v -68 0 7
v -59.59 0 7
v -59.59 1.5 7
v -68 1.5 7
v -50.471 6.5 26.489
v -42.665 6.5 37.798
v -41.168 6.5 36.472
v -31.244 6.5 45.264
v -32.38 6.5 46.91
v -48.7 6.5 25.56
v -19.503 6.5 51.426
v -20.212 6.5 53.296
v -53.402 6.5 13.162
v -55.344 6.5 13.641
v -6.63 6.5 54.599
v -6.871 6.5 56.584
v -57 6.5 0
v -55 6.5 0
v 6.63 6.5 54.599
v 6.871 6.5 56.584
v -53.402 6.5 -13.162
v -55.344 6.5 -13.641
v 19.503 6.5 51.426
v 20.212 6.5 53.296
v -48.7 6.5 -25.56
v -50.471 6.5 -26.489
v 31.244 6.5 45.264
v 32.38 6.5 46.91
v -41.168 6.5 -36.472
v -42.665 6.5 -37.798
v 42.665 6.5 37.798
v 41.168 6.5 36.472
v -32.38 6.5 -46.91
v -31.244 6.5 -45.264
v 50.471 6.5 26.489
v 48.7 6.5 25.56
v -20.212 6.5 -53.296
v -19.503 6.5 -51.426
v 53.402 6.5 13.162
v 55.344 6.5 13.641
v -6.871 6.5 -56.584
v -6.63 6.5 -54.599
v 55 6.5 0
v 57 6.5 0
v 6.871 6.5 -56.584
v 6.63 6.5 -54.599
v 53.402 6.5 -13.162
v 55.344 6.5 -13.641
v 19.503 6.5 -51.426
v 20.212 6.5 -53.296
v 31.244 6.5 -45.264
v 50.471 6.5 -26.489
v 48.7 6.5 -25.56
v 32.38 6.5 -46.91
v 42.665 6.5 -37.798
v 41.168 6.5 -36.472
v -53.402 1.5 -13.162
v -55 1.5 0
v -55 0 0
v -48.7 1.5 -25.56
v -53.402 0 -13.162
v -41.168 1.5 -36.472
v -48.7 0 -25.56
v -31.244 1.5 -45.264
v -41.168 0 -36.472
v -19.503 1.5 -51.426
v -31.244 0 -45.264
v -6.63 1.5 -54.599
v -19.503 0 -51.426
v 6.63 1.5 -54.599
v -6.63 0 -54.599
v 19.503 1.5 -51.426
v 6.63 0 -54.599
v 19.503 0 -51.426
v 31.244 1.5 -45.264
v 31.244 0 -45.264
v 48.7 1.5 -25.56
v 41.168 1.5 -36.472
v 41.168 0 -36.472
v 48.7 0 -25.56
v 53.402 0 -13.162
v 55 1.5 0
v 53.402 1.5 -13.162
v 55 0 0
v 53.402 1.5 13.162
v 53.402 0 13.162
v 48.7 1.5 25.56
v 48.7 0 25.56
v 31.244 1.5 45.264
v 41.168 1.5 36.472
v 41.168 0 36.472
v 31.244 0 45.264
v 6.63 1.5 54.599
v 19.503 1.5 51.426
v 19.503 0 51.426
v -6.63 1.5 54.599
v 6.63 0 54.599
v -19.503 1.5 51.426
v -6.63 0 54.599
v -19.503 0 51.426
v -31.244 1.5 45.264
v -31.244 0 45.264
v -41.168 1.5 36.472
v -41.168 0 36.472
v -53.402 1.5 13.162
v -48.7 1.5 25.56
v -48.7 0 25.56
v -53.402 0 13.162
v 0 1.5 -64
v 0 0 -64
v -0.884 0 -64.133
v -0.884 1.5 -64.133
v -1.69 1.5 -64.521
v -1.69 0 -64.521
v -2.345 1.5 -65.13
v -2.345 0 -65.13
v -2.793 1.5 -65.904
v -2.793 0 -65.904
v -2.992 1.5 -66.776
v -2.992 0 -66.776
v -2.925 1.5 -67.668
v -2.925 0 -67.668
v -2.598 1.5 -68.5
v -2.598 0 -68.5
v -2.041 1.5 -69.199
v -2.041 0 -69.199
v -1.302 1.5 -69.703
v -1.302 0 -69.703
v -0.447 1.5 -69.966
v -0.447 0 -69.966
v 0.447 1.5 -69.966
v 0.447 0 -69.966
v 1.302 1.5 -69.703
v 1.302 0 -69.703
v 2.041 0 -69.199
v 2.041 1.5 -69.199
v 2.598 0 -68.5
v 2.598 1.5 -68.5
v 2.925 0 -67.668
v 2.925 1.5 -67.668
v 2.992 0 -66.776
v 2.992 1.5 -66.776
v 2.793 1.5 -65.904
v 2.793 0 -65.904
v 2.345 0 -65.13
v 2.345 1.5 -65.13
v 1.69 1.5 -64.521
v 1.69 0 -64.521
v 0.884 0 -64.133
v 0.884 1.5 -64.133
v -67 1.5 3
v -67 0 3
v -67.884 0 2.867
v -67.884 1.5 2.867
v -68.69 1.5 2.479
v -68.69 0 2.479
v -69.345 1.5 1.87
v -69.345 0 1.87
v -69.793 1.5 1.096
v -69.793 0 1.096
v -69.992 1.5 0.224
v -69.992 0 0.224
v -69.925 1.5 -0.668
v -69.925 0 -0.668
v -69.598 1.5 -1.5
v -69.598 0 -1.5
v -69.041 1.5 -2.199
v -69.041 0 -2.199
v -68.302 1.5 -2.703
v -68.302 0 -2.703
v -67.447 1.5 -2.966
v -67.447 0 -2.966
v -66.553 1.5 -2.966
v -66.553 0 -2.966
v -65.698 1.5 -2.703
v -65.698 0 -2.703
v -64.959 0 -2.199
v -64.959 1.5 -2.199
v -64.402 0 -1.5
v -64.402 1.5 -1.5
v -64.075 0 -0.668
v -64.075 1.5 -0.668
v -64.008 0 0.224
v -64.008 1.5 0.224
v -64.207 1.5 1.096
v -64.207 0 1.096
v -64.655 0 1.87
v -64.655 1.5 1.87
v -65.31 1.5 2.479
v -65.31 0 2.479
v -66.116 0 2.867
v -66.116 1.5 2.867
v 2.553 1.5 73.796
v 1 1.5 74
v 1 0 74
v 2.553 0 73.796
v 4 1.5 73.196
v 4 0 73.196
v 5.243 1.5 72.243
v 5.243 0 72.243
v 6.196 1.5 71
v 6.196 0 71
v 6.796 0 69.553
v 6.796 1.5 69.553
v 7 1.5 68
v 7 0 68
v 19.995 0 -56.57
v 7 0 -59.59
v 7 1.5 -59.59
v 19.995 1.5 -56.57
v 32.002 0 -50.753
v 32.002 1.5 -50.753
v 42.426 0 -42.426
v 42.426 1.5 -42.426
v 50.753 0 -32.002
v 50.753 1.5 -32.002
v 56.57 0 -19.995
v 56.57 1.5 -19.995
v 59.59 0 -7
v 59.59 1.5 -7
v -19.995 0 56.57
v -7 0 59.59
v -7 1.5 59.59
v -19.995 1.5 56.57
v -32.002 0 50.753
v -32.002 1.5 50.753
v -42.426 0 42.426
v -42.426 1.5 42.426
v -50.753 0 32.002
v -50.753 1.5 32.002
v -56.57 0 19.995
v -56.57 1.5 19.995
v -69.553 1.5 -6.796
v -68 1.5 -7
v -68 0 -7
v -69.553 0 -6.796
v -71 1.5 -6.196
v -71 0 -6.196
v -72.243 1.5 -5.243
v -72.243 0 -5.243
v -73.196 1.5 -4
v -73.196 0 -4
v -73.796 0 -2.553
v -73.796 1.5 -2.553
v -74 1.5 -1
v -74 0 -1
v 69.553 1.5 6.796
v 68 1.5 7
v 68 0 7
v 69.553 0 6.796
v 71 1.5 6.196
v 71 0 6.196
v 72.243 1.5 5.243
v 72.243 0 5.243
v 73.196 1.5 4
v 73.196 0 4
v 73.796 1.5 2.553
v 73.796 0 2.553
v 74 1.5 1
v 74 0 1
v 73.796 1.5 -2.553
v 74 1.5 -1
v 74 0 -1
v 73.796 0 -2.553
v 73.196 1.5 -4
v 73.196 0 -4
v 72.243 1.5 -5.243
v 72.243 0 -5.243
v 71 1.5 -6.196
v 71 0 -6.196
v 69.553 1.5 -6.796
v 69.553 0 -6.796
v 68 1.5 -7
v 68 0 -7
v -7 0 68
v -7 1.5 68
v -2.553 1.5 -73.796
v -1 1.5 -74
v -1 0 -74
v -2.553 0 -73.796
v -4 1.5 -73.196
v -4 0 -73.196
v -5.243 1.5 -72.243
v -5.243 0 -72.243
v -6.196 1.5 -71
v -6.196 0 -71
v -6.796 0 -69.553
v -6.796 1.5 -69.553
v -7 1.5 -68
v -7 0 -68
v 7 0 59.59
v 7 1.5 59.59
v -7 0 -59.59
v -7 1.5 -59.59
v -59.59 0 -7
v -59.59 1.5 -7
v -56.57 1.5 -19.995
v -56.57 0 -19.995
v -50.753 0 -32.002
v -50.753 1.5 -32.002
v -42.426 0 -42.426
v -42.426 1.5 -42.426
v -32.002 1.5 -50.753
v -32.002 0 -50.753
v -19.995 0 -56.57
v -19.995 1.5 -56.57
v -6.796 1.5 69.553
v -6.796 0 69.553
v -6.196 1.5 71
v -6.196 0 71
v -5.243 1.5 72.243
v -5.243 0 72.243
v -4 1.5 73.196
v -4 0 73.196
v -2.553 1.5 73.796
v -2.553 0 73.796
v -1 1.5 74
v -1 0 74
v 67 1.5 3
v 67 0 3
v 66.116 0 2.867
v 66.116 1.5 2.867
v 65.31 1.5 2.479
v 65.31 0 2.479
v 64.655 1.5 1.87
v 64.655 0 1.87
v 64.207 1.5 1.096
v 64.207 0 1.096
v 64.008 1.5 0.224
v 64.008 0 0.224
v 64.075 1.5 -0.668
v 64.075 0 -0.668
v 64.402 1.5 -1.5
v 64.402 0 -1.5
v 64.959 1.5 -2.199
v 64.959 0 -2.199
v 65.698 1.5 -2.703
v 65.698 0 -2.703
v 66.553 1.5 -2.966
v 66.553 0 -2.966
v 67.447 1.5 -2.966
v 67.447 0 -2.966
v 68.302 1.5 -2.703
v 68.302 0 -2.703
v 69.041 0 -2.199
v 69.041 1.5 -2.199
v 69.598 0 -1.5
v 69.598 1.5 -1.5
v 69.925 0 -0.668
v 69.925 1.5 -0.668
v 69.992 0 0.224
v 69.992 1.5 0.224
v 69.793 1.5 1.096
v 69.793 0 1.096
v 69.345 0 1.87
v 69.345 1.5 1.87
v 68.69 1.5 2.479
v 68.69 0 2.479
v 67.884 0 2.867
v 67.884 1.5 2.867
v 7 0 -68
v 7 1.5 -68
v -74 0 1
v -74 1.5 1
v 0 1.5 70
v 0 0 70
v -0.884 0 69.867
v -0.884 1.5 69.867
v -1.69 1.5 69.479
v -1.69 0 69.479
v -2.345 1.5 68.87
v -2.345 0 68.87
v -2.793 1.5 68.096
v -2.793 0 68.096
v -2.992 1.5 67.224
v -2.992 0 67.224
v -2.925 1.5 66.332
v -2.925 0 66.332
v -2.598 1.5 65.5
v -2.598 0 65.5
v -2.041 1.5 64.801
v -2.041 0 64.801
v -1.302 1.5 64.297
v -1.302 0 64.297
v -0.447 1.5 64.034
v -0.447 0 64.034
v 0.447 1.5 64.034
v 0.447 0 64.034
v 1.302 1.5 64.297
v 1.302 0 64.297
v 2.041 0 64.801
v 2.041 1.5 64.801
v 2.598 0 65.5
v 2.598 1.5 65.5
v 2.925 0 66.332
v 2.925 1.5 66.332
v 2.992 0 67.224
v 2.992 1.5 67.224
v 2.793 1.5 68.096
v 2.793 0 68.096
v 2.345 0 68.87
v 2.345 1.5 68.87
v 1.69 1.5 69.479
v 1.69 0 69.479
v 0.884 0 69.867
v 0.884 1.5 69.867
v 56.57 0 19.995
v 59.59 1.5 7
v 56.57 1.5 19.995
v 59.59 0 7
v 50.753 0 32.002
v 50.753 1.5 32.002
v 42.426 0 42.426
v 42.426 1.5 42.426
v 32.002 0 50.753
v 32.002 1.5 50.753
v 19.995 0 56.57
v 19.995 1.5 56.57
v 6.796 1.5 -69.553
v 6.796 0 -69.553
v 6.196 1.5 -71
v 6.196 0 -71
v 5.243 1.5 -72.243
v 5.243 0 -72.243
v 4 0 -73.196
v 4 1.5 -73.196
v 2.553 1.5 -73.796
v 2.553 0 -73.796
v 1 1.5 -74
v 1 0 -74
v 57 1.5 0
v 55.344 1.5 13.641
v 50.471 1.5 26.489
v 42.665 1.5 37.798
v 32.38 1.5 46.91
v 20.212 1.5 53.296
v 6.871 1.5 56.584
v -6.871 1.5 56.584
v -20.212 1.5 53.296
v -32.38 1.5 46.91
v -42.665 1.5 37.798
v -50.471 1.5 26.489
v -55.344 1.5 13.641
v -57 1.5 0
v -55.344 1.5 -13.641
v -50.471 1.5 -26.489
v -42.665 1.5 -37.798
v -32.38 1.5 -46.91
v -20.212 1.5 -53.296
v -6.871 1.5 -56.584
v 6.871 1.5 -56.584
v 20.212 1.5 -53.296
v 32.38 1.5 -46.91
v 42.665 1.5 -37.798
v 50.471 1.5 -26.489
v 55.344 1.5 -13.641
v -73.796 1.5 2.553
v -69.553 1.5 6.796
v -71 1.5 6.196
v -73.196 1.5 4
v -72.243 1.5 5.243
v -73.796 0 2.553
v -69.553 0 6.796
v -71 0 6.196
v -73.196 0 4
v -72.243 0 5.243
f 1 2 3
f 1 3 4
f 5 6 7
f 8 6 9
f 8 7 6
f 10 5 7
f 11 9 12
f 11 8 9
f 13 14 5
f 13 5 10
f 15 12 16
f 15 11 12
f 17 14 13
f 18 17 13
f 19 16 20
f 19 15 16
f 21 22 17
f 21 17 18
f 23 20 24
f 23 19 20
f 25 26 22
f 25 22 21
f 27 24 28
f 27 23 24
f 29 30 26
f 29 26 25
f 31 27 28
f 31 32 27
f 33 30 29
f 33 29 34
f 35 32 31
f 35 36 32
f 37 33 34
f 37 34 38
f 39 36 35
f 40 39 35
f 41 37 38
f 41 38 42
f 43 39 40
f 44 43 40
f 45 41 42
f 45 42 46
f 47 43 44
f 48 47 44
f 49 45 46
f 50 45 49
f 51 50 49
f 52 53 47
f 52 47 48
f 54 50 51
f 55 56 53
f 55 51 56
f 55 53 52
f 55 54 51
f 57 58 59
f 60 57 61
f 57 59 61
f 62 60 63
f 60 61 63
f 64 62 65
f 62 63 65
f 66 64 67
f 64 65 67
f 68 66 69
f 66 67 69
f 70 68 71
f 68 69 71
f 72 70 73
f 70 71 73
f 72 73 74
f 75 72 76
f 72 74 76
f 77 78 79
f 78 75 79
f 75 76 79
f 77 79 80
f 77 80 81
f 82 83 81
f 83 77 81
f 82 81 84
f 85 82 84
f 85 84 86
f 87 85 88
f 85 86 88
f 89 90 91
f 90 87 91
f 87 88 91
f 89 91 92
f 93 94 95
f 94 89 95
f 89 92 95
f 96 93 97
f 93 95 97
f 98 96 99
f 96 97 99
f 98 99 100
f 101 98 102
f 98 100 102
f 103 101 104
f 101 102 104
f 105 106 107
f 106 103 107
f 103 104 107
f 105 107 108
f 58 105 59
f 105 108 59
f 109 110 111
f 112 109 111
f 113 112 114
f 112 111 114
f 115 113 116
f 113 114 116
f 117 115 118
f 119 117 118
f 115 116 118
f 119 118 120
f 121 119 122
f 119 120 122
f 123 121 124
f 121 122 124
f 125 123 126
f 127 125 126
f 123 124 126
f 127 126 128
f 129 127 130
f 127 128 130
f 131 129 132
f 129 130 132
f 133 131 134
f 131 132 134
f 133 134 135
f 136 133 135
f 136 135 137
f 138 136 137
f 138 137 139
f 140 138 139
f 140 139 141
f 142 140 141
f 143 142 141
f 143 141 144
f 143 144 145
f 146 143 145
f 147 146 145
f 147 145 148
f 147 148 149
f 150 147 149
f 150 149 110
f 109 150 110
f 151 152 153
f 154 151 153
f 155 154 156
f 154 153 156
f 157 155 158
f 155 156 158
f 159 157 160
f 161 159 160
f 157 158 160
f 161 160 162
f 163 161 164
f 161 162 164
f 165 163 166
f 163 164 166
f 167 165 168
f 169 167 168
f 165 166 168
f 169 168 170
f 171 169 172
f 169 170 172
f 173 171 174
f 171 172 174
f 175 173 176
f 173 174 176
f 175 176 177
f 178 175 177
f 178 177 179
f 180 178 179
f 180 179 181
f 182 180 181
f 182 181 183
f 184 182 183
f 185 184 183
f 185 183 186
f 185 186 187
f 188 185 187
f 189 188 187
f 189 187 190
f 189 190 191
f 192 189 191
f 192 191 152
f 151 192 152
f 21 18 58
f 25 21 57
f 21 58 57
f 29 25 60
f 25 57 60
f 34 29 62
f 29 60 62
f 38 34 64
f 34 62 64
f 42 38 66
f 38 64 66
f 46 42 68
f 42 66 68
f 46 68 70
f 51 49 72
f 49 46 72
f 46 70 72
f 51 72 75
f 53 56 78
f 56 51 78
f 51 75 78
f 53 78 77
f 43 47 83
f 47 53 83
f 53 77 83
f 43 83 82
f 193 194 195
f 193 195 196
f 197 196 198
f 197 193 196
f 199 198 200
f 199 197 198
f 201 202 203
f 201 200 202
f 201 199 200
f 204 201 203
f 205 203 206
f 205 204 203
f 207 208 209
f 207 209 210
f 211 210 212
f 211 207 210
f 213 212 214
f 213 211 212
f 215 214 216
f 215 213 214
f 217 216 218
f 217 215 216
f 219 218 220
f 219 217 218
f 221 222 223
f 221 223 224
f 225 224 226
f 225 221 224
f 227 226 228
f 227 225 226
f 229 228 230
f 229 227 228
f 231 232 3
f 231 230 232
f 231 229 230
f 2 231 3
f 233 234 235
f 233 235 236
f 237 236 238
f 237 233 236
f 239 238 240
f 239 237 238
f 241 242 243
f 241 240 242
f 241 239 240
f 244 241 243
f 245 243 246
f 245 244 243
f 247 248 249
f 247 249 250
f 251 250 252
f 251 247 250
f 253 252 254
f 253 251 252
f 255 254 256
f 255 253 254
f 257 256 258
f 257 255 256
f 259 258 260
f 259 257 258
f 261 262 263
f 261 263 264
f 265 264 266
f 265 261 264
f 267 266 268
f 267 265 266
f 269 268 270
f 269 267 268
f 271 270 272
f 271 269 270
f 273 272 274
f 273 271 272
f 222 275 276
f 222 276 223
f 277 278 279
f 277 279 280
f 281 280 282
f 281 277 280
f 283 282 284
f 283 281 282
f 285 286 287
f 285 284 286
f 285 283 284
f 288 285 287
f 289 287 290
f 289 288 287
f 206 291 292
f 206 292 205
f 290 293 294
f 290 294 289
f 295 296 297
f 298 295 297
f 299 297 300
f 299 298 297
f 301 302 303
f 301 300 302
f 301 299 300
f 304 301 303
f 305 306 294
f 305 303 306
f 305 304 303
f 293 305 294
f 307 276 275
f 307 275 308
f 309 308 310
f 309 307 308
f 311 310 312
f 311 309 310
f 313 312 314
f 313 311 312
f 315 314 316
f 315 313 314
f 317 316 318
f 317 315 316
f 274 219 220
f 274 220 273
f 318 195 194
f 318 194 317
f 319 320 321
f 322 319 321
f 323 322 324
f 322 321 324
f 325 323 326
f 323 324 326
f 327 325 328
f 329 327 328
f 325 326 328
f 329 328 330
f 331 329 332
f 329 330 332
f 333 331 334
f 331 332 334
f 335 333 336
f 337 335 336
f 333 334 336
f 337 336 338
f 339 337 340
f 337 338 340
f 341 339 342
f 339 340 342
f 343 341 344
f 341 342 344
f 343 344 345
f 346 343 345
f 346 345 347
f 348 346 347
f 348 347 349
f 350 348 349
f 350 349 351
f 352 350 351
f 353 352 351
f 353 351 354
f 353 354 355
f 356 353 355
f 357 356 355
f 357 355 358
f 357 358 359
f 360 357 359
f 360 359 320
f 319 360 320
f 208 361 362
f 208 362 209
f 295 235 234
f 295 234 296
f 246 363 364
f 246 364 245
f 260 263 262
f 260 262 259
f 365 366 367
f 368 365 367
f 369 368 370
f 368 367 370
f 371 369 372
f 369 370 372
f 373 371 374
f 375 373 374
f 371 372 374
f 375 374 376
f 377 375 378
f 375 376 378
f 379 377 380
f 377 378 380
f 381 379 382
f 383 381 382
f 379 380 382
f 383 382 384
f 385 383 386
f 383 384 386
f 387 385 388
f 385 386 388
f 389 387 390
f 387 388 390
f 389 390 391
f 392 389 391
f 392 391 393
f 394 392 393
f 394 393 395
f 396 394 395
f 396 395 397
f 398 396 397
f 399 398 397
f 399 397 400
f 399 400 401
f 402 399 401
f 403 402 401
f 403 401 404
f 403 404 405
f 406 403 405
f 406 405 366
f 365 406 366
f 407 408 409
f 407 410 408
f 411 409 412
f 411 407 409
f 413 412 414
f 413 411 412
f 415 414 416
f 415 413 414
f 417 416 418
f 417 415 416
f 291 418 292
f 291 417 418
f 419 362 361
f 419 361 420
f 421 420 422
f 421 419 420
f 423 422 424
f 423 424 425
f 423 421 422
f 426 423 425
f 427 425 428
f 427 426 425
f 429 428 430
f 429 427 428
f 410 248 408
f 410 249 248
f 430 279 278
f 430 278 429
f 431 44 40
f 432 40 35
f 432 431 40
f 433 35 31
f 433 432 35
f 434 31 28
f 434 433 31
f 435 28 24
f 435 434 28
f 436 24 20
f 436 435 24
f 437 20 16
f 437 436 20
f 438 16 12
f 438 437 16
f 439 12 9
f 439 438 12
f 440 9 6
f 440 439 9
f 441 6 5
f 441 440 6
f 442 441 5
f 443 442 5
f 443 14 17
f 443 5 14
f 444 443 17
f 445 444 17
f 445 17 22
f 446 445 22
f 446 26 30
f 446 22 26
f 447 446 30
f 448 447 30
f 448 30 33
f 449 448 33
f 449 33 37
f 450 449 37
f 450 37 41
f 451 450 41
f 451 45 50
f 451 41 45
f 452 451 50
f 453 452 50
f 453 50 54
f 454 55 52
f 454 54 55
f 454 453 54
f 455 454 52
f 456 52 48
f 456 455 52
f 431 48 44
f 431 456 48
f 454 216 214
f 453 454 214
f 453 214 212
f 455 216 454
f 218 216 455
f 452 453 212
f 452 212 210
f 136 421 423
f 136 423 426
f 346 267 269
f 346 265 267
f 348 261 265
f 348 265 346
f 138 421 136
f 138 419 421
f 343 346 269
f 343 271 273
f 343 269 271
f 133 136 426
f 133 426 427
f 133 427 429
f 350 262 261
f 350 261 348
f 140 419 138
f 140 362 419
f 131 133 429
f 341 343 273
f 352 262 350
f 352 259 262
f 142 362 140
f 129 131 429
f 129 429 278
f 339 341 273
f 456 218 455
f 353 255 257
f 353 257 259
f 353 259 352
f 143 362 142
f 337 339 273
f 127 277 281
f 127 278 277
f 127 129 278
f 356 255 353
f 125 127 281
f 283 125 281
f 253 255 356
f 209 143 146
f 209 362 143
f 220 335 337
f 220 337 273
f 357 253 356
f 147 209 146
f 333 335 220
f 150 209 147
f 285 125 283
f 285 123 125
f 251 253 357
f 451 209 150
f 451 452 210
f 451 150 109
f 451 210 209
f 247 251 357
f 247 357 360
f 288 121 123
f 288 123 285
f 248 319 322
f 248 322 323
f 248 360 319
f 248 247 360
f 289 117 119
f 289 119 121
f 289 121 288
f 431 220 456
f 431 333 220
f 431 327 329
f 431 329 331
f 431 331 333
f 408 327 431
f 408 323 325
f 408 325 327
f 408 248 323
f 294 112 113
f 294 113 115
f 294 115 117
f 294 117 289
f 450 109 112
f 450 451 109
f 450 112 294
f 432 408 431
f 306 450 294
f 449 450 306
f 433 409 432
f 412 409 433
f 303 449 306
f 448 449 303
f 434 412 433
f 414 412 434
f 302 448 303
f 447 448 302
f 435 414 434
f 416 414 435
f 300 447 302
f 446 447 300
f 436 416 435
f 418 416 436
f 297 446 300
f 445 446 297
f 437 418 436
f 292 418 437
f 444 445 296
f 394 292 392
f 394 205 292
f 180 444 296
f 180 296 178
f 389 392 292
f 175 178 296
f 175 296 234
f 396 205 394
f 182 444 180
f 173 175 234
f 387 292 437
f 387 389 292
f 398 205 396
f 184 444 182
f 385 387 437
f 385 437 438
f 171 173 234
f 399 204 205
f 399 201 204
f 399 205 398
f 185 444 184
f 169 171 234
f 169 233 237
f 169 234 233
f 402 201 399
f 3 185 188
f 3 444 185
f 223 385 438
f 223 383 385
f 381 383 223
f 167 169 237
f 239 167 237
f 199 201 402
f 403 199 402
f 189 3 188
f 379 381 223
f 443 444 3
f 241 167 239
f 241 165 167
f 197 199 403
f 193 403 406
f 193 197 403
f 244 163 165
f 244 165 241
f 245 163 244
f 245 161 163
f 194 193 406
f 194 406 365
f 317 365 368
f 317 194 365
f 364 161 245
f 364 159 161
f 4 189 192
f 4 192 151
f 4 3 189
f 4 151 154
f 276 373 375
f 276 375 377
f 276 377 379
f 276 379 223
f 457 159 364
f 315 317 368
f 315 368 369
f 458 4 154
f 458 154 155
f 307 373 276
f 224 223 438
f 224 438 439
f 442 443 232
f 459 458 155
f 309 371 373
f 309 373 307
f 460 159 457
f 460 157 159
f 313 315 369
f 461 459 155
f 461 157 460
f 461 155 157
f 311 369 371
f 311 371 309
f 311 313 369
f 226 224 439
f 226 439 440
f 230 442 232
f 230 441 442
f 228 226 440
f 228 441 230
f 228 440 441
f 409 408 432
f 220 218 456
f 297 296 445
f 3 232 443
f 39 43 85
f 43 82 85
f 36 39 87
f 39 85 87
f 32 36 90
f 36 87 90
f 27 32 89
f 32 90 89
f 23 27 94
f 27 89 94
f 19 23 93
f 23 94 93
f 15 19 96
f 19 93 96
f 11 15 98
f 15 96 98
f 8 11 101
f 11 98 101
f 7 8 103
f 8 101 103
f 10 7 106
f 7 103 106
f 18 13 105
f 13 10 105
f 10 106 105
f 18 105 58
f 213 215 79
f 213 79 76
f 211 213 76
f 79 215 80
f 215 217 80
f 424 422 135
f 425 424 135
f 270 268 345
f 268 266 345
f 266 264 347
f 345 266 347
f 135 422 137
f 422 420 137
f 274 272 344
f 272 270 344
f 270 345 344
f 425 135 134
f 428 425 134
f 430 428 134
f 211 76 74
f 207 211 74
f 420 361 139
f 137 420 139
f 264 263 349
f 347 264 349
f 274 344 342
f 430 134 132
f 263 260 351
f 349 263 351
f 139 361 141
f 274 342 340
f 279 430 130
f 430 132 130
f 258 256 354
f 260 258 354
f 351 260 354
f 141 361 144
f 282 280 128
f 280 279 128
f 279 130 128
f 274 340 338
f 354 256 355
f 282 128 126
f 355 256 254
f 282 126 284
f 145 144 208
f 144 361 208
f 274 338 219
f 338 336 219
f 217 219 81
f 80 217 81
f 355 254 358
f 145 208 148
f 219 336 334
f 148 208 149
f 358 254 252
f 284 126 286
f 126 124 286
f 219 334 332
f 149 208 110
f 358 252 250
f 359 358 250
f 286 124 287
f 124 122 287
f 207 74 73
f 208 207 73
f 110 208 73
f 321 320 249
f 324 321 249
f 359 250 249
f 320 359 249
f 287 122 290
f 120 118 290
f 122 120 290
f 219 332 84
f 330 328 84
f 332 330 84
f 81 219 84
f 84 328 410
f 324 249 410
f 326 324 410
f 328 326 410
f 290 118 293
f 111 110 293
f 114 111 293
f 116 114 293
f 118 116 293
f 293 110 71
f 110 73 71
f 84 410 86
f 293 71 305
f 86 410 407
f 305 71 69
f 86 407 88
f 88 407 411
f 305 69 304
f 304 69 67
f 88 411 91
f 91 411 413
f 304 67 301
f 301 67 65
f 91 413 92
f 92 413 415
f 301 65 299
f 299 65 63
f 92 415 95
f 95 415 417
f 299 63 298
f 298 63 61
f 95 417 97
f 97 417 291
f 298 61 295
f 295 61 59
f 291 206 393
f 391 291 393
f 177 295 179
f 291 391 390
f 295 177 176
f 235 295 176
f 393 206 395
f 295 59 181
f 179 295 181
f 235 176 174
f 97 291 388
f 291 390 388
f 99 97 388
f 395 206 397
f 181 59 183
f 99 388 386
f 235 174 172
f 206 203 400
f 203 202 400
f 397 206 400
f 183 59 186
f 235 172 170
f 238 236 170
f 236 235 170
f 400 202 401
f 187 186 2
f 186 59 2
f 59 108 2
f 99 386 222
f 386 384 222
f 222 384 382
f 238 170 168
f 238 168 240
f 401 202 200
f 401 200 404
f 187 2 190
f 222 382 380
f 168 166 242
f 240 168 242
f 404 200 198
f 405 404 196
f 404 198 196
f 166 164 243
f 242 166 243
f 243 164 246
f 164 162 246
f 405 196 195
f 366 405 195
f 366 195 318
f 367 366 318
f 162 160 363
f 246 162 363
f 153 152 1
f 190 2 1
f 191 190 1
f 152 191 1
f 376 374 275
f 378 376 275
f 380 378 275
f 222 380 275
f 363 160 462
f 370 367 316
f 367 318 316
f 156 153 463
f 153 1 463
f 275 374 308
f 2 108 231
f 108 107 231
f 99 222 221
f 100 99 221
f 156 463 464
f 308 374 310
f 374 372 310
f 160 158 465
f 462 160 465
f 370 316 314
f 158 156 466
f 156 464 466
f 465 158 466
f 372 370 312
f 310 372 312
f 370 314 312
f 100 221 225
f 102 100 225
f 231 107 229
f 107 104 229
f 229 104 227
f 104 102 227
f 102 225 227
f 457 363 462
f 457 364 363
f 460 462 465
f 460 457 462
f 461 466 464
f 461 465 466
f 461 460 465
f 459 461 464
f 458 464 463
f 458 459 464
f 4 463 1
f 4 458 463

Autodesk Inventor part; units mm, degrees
ref_plane "YZ Plane" through (0, 0, 0) normal (1, 0, 0) x (0, 1, 0)
ref_plane "XZ Plane" through (0, 0, 0) normal (0, 1, 0) x (-1, 0, 0)
ref_plane "XY Plane" through (0, 0, 0) normal (0, 0, 1) x (1, 0, 0)
sketch "Sketch1" plane through (0, 0, 0) normal (0, 1, 0) x (-1, 0, 0)
  circle A0 centre (0, 0) radius 55
  circle A1 centre (0, 0) radius 60
  line L0 (0, 57.5) -> (7, 57.5)
  line L1 (7, 57.5) -> (-7, 57.5)
  line L2 (7, 57.5) -> (-7, 57.5)
  line L3 (-7, 57.5) -> (-7, 74)
  line L4 (-7, 74) -> (7, 74)
  line L5 (7, 74) -> (7, 57.5)
  line L6 (-74, 7) -> (-57.5, 7)
  line L7 (-74, -7) -> (-74, 7)
  line L8 (-57.5, -7) -> (-74, -7)
  line L9 (-57.5, 7) -> (-57.5, -7)
  line L10 (-7, -74) -> (-7, -57.5)
  line L11 (7, -74) -> (-7, -74)
  line L12 (7, -57.5) -> (7, -74)
  line L13 (-7, -57.5) -> (7, -57.5)
  line L14 (74, -7) -> (57.5, -7)
  line L15 (74, 7) -> (74, -7)
  line L16 (57.5, 7) -> (74, 7)
  line L17 (57.5, -7) -> (57.5, 7)
  point P0 (-7, 59.5903)
  point P1 (-59.5903, 7)
  point P2 (-59.5903, -7)
  point P3 (-7, -59.5903)
  point P4 (7, -59.5903)
  point P5 (59.5903, -7)
  point P6 (59.5903, 7)
  point P7 (7, 59.5903)
  dimension "d0" = 110
  dimension "d1" = 120
  dimension "d2" = 7
  dimension "d3" = 14
  dimension "d7" = 360
extrude "Extrusion1" add sketch "Sketch1" along normal blind 1.5
fillet "Fillet1" radius 6 8 edges at (74, 0.75, -7) (74, 0.75, 7) (7, 0.75, -74) (-7, 0.75, -74) (-74, 0.75, -7) (-74, 0.75, 7) (-7, 0.75, 74) (7, 0.75, 74)
sketch "Sketch2" plane through (0, 1.5, 0) normal (0, 1, 0) x (1, 0, 0)
  line L0 (-1, -74) -> (1, -74) projected
  line L1 (0, -74) -> (0, -67)
  line L2 (74, -1) -> (74, 1) projected
  line L3 (74, 0) -> (67, 0)
  line L4 (1, 74) -> (-1, 74) projected
  line L5 (0, 74) -> (0, 67)
  line L6 (-74, 1) -> (-74, -1) projected
  line L7 (-74, 0) -> (-67, 0)
  point P0 (0, 0)
  dimension "d12" = 7
  dimension "d13" = 7
  dimension "d14" = 7
  dimension "d15" = 7
hole "Hole1" at (0, 1.5, 67) at (-67, 1.5, 0) at (0, 1.5, -67) at (67, 1.5, 0) direction (0, -1, 0) diameter 6 end through all
sketch "Sketch3" plane through (0, 1.5, 0) normal (0, 1, 0) x (1, 0, 0)
  circle A0 centre (0, 0) radius 55
  circle A1 centre (0, 0) radius 55 projected
  line L0 (-55, 0) -> (-57, 0)
  circle A2 centre (0, 0) radius 57
  dimension "d23" = 2
extrude "Extrusion2" add sketch "Sketch3" along normal blind 5
properties part number "Fan_Part2"
